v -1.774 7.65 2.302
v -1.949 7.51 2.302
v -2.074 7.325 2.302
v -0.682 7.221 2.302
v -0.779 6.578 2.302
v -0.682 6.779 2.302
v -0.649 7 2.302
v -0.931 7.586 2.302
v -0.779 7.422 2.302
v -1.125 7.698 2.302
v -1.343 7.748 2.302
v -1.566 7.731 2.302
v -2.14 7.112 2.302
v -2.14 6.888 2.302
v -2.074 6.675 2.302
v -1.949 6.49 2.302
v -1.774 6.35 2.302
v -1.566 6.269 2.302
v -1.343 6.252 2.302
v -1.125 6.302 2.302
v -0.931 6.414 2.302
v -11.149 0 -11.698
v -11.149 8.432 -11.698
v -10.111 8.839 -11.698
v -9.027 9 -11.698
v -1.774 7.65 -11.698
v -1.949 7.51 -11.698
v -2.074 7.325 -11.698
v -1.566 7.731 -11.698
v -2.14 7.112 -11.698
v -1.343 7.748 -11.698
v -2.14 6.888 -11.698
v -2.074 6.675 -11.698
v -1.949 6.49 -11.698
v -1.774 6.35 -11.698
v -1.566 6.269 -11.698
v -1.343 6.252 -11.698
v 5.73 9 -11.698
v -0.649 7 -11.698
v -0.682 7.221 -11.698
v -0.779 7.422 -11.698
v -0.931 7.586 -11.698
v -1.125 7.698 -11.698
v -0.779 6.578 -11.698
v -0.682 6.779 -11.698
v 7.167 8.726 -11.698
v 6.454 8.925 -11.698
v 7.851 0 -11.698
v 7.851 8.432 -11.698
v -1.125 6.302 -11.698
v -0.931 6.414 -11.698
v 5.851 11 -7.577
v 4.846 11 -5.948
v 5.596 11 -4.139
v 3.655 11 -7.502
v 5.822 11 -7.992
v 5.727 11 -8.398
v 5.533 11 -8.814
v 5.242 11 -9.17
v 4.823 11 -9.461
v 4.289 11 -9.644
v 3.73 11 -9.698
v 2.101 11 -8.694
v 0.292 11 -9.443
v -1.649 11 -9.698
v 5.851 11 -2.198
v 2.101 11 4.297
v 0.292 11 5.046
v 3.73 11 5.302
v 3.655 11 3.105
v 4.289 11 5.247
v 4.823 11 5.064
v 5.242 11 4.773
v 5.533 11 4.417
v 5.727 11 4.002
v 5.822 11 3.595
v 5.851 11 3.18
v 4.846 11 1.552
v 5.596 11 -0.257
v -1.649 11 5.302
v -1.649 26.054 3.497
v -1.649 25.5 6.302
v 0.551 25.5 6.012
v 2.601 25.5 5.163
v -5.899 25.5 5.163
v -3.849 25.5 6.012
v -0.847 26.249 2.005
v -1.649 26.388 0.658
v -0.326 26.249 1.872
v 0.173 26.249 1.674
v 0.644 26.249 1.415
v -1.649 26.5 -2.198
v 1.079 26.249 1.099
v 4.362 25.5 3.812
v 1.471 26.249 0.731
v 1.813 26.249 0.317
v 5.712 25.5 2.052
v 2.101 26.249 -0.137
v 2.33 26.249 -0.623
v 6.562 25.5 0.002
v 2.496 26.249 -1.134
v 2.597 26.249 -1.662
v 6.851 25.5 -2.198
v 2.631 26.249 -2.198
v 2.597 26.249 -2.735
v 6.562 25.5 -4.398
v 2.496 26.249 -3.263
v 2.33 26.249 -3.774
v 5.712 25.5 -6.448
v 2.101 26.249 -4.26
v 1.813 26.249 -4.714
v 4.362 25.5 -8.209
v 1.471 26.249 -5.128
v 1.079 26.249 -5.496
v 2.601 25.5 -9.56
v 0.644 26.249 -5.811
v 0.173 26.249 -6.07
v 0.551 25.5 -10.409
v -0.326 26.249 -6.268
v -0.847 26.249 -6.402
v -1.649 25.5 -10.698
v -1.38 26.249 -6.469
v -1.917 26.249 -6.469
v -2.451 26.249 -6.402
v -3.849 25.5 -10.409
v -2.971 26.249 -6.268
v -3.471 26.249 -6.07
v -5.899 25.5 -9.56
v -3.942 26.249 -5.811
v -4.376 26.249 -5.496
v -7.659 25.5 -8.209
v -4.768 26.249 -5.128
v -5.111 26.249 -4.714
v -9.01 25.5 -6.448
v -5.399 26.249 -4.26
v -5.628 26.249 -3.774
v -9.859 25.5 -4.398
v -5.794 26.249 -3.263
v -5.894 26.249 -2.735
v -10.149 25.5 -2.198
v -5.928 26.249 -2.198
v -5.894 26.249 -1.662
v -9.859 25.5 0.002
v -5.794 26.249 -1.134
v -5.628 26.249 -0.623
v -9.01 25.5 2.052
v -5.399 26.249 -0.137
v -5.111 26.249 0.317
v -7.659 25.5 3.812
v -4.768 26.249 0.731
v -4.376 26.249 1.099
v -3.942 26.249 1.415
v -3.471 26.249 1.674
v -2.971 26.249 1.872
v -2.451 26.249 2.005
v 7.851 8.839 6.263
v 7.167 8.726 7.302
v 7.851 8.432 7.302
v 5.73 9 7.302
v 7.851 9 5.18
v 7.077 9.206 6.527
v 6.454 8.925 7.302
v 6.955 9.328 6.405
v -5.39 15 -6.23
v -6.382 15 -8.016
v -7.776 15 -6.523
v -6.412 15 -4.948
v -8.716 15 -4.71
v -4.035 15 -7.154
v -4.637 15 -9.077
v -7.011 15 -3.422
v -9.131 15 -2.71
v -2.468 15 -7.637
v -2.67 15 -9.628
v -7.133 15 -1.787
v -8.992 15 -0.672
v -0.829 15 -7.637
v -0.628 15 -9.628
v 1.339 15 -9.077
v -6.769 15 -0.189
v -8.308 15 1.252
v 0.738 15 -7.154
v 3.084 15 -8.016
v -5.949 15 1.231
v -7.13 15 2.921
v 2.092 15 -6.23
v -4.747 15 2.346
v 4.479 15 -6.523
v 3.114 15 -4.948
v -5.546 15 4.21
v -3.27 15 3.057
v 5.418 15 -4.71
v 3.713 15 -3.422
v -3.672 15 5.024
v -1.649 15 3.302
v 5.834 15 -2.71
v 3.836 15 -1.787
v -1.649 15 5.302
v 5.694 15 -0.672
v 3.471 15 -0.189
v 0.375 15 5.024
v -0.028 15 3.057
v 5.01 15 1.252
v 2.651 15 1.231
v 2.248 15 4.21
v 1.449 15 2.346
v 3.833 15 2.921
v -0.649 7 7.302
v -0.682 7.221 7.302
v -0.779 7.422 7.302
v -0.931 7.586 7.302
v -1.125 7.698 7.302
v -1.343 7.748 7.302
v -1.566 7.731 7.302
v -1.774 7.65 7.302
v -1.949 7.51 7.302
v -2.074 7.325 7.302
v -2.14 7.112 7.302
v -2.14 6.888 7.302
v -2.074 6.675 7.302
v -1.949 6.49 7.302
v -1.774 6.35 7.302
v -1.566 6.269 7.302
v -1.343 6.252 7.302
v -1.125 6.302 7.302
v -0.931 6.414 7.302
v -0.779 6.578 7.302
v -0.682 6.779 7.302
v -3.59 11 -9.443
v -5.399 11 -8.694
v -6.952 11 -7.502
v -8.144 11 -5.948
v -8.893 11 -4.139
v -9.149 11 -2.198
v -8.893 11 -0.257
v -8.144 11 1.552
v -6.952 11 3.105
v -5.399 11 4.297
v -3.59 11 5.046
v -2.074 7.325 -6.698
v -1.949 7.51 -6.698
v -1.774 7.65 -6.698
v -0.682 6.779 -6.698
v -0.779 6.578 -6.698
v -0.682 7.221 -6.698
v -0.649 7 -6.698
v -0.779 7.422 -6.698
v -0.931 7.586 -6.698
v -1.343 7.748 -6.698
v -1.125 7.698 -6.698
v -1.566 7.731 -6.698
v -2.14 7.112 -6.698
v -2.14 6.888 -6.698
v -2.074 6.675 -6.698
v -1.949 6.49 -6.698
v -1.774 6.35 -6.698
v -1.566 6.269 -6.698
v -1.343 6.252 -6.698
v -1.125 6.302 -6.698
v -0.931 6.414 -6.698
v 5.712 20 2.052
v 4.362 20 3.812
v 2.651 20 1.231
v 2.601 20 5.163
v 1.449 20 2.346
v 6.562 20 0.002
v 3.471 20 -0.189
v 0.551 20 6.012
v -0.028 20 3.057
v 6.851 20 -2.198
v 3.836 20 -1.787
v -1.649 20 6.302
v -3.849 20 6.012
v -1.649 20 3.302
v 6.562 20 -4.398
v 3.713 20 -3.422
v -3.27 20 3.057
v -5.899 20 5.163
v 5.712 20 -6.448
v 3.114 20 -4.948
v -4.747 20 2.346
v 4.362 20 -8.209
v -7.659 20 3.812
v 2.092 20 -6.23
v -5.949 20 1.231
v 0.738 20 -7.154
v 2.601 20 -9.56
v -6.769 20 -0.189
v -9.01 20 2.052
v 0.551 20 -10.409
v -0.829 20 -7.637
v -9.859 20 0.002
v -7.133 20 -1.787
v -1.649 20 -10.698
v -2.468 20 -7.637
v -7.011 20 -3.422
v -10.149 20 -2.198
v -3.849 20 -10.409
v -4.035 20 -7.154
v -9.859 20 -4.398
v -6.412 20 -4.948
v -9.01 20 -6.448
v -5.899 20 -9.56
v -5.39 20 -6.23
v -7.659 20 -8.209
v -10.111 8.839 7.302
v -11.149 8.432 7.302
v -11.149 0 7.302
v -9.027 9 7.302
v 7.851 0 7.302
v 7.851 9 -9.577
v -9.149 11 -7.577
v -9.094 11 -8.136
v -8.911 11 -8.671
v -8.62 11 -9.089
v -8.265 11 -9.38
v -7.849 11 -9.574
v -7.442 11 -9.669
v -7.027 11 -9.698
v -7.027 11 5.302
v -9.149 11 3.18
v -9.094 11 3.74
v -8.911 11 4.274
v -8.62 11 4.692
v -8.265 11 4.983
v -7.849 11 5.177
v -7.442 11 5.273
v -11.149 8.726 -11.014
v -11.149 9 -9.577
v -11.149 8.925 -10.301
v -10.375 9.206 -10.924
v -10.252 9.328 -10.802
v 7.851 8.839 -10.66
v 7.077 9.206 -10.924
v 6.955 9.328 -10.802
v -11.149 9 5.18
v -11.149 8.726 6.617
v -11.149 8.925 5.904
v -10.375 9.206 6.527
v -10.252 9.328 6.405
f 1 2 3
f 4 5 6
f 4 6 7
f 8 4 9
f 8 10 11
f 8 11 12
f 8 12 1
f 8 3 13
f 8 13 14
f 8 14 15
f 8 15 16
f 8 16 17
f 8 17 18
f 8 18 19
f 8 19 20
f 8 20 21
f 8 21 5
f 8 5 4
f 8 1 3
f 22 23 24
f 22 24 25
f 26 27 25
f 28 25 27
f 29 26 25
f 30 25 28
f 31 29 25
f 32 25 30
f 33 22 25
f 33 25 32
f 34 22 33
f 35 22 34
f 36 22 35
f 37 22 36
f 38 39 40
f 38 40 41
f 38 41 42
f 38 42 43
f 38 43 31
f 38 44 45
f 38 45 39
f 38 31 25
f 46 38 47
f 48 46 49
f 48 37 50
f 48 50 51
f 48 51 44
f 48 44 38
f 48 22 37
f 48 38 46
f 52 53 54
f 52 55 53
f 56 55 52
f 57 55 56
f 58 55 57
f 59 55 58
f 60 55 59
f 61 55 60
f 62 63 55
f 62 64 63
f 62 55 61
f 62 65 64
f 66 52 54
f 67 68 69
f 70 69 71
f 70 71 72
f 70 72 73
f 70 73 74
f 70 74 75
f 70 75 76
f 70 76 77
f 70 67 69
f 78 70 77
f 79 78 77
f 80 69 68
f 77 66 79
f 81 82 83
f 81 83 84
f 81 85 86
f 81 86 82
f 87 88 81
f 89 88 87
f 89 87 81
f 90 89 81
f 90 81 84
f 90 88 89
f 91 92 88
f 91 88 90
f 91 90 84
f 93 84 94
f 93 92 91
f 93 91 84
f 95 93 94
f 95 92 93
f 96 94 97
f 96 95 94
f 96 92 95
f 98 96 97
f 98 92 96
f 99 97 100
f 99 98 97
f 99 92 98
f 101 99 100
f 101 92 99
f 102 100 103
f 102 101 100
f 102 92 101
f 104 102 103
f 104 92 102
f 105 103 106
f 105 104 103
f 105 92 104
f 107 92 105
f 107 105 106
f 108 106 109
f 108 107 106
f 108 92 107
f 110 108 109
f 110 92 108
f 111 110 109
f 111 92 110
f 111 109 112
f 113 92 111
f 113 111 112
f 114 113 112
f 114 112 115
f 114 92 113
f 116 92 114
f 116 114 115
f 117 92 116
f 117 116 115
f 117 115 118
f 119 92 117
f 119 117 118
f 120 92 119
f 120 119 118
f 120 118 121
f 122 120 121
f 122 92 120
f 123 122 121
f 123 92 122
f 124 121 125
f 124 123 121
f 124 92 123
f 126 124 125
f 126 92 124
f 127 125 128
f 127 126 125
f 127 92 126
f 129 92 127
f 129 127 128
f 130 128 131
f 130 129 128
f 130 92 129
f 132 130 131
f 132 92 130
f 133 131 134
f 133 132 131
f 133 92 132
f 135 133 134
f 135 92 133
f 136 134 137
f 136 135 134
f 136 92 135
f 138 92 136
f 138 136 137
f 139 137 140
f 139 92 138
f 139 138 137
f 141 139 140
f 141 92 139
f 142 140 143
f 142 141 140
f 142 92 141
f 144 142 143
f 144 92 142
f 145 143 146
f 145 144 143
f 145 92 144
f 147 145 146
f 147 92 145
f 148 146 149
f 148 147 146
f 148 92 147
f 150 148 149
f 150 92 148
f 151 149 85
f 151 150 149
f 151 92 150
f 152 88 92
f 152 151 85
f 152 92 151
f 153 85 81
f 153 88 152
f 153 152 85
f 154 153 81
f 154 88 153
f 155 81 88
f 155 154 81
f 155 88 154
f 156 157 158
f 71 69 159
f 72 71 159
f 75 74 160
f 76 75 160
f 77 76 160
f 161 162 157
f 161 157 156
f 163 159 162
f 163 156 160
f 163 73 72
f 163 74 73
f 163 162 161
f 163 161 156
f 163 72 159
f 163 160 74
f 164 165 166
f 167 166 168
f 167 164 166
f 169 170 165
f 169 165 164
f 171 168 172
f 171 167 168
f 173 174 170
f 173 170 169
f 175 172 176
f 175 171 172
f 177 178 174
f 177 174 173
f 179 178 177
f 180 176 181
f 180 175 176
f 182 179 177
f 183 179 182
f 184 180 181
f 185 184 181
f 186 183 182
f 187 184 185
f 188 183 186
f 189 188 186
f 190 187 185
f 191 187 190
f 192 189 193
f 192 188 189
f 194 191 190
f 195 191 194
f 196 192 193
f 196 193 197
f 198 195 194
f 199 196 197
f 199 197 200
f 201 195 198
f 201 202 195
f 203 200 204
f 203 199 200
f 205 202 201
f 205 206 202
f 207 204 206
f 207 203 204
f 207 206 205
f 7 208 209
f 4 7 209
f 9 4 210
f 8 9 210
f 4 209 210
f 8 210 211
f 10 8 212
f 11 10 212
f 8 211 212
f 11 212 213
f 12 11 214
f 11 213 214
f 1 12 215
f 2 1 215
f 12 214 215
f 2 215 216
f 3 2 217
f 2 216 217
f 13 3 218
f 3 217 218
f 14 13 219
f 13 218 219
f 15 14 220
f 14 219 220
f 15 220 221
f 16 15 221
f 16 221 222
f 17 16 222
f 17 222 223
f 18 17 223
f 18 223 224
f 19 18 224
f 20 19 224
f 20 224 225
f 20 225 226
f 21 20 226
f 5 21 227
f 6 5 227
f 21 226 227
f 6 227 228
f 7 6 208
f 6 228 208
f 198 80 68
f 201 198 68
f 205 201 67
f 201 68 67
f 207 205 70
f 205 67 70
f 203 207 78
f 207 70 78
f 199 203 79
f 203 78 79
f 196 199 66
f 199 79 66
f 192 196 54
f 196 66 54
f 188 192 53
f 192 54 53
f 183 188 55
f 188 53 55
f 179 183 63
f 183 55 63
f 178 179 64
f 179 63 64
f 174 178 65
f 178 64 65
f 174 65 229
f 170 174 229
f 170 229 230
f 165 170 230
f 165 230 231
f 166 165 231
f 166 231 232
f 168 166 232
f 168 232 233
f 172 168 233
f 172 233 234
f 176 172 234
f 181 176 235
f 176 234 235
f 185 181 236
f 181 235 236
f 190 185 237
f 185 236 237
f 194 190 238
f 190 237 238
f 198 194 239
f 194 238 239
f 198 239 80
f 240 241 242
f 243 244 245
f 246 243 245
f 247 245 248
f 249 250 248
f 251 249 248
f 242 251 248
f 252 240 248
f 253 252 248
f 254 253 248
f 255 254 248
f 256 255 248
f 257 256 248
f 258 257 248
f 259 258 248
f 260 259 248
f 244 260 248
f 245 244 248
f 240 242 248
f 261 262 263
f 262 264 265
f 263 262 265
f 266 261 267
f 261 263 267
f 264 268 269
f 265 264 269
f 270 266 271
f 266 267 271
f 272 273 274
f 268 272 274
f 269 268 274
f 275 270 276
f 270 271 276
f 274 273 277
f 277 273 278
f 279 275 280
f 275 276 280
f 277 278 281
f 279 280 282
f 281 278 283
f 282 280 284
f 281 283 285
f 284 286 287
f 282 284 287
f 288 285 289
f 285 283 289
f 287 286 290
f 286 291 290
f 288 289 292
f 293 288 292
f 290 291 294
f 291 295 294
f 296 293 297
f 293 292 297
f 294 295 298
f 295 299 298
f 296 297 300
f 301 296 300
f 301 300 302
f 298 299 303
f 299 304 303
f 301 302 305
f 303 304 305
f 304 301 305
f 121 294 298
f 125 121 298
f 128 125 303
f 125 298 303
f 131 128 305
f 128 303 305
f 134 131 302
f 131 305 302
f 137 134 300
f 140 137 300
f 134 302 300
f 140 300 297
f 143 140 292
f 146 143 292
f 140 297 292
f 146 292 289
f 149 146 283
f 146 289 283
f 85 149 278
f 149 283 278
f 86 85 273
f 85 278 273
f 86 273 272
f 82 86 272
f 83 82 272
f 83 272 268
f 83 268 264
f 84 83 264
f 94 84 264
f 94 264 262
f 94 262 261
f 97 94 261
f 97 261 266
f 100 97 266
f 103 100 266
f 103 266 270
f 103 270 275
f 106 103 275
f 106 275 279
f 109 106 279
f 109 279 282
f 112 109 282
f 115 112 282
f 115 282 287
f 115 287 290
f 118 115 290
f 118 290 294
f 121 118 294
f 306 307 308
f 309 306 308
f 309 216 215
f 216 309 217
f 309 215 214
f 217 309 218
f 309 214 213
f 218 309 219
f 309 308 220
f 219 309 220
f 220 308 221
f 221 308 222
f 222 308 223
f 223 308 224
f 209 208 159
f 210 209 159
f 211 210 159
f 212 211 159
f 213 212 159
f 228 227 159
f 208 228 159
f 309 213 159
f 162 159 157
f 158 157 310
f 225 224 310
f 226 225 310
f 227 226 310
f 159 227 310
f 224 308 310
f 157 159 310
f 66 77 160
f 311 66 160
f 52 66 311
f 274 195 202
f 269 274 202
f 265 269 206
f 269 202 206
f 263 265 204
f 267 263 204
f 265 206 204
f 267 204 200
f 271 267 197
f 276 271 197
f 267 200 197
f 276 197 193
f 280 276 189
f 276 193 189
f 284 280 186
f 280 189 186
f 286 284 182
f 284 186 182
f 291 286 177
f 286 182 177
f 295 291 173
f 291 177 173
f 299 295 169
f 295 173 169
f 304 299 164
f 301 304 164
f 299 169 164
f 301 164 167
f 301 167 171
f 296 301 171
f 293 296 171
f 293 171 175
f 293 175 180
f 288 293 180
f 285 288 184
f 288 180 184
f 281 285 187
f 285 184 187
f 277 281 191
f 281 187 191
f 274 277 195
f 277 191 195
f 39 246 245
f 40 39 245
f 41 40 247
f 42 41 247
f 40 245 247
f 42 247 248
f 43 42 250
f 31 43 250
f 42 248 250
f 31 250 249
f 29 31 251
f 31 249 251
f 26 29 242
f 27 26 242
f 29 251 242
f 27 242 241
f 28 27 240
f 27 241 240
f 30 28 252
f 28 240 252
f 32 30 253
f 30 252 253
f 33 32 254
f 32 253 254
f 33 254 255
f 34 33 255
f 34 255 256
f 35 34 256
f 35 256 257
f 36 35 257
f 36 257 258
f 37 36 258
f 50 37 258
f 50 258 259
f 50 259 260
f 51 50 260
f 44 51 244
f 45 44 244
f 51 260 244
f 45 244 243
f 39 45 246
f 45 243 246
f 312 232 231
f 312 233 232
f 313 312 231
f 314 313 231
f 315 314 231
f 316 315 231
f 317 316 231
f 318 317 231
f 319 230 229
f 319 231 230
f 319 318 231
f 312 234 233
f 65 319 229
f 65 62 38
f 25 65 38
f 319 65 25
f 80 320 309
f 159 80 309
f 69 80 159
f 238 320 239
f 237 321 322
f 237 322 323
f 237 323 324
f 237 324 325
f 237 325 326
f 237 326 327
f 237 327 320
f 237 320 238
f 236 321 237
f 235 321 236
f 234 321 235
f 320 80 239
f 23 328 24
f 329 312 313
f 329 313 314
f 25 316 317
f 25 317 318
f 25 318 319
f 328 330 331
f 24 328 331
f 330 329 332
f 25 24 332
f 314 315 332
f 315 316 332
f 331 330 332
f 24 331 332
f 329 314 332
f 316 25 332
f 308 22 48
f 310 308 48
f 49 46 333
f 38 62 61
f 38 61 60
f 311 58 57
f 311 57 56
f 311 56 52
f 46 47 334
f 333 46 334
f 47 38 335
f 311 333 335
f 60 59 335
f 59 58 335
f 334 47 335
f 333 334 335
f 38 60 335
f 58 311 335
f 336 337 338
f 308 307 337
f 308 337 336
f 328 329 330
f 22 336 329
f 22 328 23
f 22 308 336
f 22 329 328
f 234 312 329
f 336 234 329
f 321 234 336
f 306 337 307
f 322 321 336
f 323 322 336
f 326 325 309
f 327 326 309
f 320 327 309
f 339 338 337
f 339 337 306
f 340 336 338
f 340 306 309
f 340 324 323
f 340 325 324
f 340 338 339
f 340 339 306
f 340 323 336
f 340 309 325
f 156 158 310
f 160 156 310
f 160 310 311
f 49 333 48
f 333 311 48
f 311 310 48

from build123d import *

# Parameters (mm, degrees)
SKETCH1_W           = 19
SKETCH1_H           = 19
BOSS_EXTRUDE1_DEPTH = 9
BOSS_EXTRUDE2_START = 9
SKETCH1_2_W         = 19
SKETCH1_2_H         = 19
BOSS_EXTRUDE2_DEPTH = 2
BOSS_EXTRUDE2_TAPER = 45
FILLET1_R           = 3
SKETCH2_R           = 7.5
BOSS_EXTRUDE3_DEPTH = 4
SKETCH3_R           = 5.5
BOSS_EXTRUDE4_DEPTH = 5
SKETCH4_R           = 8.5
BOSS_EXTRUDE5_DEPTH = 5.5
DOME1_FACE_RADIUS   = 8.5
DOME1_HEIGHT        = 1
SKETCH5_R           = 0.75
CUT_EXTRUDE1_DEPTH  = 5
CUT_EXTRUDE2_START  = -14
SKETCH5_2_R         = 0.75
CUT_EXTRUDE2_DEPTH  = 5


with BuildPart() as part:
    # Sketch1 → Boss-Extrude1 (new body)
    with BuildSketch(Plane(origin=(0, 0, 0), x_dir=(1, 0, 0), z_dir=(0, 1, 0))):
        with Locations((-1.648760331, 2.198347107)):
            Rectangle(SKETCH1_W, SKETCH1_H)
    extrude(amount=BOSS_EXTRUDE1_DEPTH)

    # Sketch1<2> → Boss-Extrude2 (add)
    with BuildSketch(Plane(origin=(0, 0, 0), x_dir=(1, 0, 0), z_dir=(0, 1, 0)).offset(BOSS_EXTRUDE2_START)):
        with Locations((-1.648760331, 2.198347107)):
            Rectangle(SKETCH1_2_W, SKETCH1_2_H)
    extrude(amount=BOSS_EXTRUDE2_DEPTH, taper=BOSS_EXTRUDE2_TAPER)

    # Fillet1
    fillet1_edges = [part.edges().sort_by_distance(p)[0] for p in [
        (6.851239669, 10, 6.301652893),
        (6.851239669, 10, -10.698347107),
        (-10.148760331, 10, -10.698347107),
        (-10.148760331, 10, 6.301652893),
    ]]
    fillet(fillet1_edges, radius=FILLET1_R)

    # Sketch2 → Boss-Extrude3 (add)
    with BuildSketch(Plane(origin=(0, 11, 0), x_dir=(1, 0, 0), z_dir=(0, 1, 0))):
        with Locations(Location((-1.648760331, 2.198347107, 0), (0, 0, 270))):
            Circle(SKETCH2_R)
    extrude(amount=BOSS_EXTRUDE3_DEPTH)

    # Sketch3 → Boss-Extrude4 (add)
    with BuildSketch(Plane(origin=(0, 15, 0), x_dir=(1, 0, 0), z_dir=(0, 1, 0))):
        with Locations(Location((-1.648760331, 2.198347107, 0), (0, 0, 270))):
            Circle(SKETCH3_R)
    extrude(amount=BOSS_EXTRUDE4_DEPTH)

    # Sketch4 → Boss-Extrude5 (add)
    with BuildSketch(Plane(origin=(0, 20, 0), x_dir=(1, 0, 0), z_dir=(0, 1, 0))):
        with Locations(Location((-1.648760331, 2.198347107, 0), (0, 0, 90))):
            Circle(SKETCH4_R)
    extrude(amount=BOSS_EXTRUDE5_DEPTH)

    # Dome1: a dome of height H over a round flat face of radius A is a cap of a sphere of radius (A * A + H * H) / (2 * H)
    dome1_r = (DOME1_FACE_RADIUS * DOME1_FACE_RADIUS + DOME1_HEIGHT * DOME1_HEIGHT) / (2 * DOME1_HEIGHT)
    dome1_base = Plane((-1.648760331, 25.5, -2.198347107), z_dir=(0, 1, 0))
    with Locations(dome1_base.offset(DOME1_HEIGHT - dome1_r)):
        dome1_ball = Sphere(dome1_r, mode=Mode.PRIVATE)
    add(split(dome1_ball, bisect_by=dome1_base, keep=Keep.TOP, mode=Mode.PRIVATE))

    # Sketch5 → Cut-Extrude1 (cut)
    with BuildSketch(Plane.XY.offset(7.301652893)):
        with Locations((-1.398760331, 7)):
            Circle(SKETCH5_R)
    extrude(amount=-CUT_EXTRUDE1_DEPTH, mode=Mode.SUBTRACT)

    # Sketch5<2> → Cut-Extrude2 (cut)
    with BuildSketch(Plane.XY.offset(7.301652893).offset(CUT_EXTRUDE2_START)):
        with Locations((-1.398760331, 7)):
            Circle(SKETCH5_2_R)
    extrude(amount=-CUT_EXTRUDE2_DEPTH, mode=Mode.SUBTRACT)


solid = part.part
